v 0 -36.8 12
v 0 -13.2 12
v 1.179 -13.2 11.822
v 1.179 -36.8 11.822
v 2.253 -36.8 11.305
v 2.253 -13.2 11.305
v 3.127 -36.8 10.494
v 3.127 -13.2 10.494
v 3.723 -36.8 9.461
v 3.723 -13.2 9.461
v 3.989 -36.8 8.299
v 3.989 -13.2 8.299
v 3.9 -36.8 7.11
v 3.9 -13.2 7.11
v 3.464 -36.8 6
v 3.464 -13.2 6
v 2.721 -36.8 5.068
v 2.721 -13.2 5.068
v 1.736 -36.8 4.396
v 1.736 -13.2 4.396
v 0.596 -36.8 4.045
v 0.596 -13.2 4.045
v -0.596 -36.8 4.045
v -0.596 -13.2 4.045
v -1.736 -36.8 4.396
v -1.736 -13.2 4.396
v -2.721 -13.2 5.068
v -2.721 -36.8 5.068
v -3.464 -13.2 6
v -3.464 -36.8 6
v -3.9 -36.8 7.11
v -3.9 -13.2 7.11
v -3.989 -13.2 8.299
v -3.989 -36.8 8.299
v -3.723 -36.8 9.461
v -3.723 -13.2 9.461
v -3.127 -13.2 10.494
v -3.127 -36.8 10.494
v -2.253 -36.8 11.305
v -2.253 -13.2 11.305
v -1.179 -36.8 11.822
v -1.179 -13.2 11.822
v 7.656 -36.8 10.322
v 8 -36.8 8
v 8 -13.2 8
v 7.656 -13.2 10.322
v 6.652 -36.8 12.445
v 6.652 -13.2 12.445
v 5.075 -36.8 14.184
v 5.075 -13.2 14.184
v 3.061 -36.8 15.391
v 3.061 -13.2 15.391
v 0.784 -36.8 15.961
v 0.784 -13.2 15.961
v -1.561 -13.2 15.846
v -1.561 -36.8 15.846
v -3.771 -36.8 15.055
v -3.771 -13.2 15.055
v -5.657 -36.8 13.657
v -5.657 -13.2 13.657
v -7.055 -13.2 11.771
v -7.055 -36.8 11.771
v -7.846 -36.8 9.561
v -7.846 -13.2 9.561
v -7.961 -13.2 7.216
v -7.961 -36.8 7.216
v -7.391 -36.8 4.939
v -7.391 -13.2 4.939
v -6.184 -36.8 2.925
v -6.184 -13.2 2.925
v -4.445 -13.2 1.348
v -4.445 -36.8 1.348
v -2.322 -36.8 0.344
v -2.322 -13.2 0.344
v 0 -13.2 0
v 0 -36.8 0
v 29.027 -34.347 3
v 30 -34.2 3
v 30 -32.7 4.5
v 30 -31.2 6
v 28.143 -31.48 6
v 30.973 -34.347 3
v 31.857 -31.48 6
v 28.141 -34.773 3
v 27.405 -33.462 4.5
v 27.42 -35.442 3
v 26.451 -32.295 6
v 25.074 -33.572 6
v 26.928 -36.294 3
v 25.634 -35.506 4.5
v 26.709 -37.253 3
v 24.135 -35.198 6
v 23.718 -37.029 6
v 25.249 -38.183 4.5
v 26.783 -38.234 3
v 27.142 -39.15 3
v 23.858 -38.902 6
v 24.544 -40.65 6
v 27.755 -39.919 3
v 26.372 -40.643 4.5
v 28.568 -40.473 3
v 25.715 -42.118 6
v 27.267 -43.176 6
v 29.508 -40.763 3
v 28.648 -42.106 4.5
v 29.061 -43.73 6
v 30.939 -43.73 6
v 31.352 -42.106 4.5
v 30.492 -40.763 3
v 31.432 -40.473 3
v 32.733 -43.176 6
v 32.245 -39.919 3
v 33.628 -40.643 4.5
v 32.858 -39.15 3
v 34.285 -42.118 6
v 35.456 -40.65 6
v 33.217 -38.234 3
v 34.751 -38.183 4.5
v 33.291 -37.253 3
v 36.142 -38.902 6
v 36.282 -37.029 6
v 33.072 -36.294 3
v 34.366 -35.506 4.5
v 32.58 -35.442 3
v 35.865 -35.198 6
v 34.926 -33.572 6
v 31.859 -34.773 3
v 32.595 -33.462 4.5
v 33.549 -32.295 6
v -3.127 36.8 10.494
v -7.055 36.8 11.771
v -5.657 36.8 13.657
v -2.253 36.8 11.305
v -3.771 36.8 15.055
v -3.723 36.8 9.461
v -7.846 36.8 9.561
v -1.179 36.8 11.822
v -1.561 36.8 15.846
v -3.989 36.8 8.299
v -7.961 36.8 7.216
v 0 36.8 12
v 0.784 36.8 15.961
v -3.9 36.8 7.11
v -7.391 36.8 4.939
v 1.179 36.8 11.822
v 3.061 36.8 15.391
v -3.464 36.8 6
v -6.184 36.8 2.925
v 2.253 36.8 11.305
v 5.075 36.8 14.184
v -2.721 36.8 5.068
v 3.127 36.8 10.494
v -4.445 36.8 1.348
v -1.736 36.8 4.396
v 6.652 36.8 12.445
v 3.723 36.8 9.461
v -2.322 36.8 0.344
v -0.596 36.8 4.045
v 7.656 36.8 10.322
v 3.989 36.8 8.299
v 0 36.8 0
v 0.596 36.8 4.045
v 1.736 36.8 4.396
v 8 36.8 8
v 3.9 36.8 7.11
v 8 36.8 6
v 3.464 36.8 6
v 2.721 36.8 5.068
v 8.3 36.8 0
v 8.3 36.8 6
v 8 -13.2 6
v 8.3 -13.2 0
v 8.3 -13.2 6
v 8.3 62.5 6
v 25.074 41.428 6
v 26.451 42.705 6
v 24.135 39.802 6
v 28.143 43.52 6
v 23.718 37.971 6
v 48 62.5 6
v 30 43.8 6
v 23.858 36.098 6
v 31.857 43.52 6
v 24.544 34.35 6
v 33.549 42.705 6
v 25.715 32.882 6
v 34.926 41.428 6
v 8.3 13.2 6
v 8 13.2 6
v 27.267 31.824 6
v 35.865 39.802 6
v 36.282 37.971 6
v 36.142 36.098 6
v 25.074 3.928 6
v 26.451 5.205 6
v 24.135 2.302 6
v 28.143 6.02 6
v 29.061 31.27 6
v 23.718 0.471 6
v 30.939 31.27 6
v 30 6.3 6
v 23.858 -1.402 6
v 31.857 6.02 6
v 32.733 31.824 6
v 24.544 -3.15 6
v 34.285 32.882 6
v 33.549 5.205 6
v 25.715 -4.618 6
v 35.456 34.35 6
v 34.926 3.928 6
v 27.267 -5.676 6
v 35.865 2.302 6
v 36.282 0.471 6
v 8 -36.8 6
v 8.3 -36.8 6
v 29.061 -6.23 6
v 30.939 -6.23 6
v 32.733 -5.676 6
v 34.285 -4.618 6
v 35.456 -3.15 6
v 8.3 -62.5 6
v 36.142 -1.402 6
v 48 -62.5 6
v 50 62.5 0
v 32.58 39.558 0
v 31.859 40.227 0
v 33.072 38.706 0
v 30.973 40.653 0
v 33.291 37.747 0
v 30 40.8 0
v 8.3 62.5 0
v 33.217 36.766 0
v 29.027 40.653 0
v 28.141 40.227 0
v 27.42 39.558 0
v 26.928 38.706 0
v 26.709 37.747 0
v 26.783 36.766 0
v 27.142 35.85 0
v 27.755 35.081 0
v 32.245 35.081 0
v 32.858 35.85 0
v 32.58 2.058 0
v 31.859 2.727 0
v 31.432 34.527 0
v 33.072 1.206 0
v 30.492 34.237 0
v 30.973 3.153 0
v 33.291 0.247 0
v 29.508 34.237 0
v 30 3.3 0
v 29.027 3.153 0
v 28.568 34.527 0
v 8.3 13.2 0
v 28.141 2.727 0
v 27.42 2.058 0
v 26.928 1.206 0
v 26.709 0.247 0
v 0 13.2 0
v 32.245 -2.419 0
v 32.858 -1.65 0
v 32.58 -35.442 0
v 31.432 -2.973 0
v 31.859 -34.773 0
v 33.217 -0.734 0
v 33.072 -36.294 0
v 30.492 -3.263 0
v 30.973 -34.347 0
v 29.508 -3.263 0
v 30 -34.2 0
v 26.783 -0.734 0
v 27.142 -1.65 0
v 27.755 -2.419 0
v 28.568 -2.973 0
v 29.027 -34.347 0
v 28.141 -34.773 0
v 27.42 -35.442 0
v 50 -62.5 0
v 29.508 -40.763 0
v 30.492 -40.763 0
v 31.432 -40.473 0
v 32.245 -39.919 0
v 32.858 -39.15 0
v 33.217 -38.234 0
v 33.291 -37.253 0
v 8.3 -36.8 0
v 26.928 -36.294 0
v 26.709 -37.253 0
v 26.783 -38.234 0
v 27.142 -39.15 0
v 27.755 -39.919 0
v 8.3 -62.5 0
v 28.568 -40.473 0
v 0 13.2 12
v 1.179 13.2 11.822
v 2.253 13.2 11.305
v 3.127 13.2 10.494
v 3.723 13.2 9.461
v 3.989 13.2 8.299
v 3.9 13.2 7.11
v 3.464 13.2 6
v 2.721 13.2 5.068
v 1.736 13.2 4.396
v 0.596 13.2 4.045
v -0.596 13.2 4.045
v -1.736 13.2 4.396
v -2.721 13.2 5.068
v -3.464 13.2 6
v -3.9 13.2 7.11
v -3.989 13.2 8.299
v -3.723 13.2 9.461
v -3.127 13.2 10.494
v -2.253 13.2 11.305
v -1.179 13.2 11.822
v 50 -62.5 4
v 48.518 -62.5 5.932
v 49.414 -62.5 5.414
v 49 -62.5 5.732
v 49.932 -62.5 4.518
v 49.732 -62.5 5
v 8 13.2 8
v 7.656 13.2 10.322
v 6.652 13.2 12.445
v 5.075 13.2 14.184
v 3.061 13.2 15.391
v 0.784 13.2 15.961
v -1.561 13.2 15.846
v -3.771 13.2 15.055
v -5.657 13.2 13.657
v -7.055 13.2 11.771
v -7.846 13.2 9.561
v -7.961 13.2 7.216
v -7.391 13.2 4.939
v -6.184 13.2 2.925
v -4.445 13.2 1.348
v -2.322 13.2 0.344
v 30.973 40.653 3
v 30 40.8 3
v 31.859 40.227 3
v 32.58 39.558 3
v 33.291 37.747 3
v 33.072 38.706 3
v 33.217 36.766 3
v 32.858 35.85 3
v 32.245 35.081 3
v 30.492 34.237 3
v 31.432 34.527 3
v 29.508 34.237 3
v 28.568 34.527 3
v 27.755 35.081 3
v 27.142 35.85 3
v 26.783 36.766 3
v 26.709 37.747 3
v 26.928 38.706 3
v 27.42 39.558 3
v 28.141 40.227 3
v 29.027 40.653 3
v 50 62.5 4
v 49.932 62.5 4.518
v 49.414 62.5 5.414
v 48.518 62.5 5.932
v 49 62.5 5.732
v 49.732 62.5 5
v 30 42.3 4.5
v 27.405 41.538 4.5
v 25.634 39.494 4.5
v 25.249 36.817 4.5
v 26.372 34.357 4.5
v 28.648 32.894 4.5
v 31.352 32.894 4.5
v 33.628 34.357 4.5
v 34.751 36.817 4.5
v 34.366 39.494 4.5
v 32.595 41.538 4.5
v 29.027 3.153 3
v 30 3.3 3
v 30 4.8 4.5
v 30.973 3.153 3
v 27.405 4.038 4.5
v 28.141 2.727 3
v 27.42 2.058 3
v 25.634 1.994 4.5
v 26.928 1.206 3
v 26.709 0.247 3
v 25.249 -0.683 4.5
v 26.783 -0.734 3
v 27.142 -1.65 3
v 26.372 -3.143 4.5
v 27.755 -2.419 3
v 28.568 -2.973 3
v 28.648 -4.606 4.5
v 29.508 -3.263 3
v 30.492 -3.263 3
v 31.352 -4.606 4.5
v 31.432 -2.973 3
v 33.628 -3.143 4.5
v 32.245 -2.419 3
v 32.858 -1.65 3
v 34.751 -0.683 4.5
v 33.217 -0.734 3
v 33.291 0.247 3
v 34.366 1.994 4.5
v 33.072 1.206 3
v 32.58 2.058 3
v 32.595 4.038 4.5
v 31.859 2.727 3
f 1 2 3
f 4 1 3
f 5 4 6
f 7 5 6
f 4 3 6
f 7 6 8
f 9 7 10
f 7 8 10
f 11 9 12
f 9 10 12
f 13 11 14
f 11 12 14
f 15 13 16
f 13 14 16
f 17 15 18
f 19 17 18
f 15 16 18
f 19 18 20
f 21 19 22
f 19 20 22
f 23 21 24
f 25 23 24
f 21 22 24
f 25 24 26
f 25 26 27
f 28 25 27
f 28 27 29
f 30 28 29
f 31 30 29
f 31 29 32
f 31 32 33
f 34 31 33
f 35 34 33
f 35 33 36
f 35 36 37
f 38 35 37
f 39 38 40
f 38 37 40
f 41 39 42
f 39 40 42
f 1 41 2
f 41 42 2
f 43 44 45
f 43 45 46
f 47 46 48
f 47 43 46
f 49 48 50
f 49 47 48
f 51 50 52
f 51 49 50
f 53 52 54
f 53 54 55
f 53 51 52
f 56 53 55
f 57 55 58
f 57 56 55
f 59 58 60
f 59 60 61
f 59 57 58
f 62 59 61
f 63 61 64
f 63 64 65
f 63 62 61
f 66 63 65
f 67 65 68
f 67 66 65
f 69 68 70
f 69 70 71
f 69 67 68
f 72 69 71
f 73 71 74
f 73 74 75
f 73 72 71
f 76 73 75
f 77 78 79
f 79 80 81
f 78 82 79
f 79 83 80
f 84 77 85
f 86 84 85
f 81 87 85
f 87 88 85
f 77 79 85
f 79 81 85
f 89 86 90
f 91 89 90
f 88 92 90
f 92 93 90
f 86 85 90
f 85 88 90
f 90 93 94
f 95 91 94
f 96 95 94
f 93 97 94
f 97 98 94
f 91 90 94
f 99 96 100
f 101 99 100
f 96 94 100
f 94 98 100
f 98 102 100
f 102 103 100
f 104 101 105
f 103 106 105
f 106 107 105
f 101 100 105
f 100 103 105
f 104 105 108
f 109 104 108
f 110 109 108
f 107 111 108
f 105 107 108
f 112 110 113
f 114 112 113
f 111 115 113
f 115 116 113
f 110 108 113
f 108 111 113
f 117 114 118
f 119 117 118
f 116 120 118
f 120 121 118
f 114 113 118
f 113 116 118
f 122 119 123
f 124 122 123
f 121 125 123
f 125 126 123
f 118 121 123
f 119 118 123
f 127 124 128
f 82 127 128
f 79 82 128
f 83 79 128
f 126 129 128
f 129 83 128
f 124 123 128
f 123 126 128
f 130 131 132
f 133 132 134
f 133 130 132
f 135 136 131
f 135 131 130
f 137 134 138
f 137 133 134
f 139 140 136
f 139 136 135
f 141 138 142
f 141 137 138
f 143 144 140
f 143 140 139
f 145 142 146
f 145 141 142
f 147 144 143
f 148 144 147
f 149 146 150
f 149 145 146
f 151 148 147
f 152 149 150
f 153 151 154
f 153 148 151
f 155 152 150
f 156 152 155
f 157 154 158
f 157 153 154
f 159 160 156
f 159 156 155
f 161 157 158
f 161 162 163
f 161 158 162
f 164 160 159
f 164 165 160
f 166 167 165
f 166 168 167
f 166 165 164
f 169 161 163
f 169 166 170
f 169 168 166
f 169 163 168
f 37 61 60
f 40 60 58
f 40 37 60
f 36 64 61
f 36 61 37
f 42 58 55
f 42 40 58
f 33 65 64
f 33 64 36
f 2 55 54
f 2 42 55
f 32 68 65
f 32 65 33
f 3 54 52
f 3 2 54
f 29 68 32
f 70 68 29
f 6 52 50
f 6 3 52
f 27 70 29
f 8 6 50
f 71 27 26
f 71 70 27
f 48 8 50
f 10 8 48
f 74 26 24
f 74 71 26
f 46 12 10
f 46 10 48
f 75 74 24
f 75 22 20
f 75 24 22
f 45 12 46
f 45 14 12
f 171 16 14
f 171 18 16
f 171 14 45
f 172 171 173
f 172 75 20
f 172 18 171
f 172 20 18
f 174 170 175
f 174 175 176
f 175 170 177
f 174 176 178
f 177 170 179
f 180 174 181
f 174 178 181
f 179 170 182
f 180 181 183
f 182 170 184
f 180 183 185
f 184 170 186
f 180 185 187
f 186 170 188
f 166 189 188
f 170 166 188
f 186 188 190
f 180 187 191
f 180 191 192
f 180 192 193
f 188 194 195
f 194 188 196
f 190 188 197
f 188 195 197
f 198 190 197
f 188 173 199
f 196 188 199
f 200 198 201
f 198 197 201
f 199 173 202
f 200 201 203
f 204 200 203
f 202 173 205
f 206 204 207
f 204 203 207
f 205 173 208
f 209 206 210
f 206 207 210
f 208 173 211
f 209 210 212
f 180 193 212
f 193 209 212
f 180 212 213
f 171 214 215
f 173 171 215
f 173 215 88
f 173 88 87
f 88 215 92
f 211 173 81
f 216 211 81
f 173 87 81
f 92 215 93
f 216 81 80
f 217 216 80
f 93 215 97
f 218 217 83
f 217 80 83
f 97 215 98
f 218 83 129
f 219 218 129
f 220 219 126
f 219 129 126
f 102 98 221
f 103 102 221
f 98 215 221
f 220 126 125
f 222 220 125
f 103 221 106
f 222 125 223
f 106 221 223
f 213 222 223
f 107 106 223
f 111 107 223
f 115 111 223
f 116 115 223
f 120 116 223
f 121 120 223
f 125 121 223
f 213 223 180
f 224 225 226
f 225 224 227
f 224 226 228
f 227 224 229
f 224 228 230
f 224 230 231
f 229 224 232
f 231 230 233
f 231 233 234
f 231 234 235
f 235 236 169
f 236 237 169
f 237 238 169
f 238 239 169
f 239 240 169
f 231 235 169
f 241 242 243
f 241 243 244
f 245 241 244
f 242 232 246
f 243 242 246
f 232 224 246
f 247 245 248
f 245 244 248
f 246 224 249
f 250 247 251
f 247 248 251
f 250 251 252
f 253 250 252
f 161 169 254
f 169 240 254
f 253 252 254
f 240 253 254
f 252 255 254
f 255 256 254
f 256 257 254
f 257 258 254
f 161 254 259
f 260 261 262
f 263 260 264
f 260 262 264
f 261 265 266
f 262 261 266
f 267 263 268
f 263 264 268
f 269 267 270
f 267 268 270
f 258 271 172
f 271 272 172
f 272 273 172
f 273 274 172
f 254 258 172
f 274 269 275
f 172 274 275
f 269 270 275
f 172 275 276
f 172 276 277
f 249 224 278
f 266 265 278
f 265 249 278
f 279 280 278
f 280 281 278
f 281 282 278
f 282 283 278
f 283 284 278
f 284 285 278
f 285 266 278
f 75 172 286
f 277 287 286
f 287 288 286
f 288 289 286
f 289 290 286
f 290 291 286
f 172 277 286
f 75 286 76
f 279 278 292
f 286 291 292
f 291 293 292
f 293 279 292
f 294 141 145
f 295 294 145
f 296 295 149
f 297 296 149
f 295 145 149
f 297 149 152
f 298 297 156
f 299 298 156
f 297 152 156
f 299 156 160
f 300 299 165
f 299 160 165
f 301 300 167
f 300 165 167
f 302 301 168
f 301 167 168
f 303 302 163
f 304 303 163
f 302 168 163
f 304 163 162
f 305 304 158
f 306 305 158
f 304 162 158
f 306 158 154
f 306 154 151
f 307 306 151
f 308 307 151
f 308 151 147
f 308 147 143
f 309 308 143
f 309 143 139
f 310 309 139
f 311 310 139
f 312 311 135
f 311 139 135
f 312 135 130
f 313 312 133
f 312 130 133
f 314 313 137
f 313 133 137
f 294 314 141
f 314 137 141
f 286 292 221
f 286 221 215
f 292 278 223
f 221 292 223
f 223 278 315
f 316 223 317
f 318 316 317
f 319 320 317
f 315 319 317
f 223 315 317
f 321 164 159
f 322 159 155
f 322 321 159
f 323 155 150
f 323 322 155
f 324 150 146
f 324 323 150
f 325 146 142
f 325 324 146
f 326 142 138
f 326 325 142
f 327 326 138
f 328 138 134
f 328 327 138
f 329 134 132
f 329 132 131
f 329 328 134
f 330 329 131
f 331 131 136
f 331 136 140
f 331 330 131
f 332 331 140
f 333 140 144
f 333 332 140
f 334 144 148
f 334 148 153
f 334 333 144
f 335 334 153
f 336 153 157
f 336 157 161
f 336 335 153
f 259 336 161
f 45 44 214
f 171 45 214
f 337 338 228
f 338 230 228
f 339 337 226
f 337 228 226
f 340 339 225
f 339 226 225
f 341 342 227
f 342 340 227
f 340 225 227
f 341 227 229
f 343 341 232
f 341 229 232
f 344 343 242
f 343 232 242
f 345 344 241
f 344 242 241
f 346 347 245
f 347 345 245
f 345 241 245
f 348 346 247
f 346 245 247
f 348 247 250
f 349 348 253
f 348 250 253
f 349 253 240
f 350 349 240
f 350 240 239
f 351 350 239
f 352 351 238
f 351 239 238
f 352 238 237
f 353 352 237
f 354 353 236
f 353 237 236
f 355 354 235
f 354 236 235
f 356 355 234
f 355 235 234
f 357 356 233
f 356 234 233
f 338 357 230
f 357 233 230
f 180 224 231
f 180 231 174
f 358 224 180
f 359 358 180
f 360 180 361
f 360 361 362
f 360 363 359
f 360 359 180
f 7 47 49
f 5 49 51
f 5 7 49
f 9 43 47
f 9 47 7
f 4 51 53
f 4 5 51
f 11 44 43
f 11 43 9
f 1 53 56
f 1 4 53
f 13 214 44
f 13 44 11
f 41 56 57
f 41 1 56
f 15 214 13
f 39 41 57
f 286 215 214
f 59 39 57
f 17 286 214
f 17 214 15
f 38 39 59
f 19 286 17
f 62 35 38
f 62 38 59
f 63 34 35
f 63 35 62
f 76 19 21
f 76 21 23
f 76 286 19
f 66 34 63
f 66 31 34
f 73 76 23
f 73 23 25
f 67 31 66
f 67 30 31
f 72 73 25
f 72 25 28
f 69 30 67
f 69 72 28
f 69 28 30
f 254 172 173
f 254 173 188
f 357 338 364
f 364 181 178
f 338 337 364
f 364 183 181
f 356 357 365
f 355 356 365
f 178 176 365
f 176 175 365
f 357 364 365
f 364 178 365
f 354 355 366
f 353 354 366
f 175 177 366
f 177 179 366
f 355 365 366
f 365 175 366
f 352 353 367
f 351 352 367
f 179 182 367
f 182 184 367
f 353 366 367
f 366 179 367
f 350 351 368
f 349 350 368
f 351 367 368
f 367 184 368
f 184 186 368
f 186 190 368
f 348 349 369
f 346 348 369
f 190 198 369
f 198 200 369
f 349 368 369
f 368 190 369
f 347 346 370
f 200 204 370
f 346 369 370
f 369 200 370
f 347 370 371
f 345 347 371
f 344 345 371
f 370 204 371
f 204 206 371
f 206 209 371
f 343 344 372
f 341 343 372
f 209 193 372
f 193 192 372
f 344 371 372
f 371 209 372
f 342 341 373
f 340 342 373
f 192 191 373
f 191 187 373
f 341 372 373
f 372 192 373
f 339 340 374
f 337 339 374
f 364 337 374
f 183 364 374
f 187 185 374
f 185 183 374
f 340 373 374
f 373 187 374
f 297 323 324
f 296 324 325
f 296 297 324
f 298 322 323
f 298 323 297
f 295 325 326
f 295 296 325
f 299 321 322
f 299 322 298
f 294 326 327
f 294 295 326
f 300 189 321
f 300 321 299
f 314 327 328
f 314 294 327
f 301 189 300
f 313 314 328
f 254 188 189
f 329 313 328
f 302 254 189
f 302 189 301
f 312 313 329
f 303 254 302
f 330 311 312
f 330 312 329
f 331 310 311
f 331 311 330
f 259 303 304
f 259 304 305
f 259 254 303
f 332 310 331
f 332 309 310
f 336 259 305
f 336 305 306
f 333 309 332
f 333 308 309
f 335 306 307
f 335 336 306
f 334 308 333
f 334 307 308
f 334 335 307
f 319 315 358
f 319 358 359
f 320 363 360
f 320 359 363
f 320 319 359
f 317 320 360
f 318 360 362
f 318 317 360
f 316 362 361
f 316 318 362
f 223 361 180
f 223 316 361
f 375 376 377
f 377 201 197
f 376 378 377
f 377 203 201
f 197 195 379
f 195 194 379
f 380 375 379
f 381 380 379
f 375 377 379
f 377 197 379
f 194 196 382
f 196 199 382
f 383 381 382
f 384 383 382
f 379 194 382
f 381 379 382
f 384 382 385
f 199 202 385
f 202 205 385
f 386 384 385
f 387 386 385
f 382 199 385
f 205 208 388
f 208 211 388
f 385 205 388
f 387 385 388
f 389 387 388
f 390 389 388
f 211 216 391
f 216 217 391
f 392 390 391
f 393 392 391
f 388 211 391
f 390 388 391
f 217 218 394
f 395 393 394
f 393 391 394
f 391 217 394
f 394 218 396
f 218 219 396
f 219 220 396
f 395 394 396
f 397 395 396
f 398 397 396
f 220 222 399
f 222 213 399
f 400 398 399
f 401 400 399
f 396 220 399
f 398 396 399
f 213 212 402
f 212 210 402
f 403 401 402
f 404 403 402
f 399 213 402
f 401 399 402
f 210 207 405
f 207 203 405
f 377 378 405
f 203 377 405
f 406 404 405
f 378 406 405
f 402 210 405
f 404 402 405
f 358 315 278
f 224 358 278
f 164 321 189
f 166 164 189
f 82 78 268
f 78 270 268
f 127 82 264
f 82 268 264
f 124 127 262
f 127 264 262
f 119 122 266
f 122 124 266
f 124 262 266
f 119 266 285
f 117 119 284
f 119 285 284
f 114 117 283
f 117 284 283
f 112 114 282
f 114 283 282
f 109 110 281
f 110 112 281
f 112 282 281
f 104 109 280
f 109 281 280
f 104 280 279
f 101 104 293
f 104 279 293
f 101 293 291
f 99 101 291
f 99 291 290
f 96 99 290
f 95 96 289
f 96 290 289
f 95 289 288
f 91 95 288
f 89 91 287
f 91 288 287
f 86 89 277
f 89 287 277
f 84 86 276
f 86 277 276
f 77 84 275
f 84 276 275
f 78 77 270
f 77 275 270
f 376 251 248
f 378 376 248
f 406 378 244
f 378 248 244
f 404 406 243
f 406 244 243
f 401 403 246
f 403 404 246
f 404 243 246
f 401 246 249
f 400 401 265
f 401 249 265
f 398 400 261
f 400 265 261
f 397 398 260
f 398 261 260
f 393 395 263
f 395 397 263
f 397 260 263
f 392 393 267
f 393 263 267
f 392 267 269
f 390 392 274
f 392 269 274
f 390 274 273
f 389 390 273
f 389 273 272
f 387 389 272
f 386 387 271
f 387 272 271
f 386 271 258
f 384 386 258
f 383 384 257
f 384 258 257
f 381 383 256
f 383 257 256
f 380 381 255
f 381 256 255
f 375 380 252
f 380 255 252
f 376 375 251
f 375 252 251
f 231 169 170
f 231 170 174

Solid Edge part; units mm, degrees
sketch "Sketch1" plane through (0, 0, 0) normal (0, -1, 0) x (1, 0, 0)
  arc A0 (0, 0) -> (8, 8) centre (0, 8) cw
  line L0 (8, 8) -> (8, 6)
  line L1 (8, 6) -> (48, 6)
  arc A1 (48, 6) -> (50, 4) centre (48, 4) cw
  line L2 (50, 4) -> (50, 0)
  line L3 (50, 0) -> (0, 0)
extrude "ExtrudedProtrusion_1" add sketch "Sketch1" against normal blind 62.5 and the other way blind 62.5
sketch "Sketch2" plane through (0, 0, 0) normal (0, 0, 1) x (1, 0, 0)
  line L0 (-21, 62.5) -> (-21, -62.5)
  line L1 (-21, -62.5) -> (8.3, -62.5)
  line L2 (8.3, -62.5) -> (8.3, -36.8)
  line L3 (8.3, -36.8) -> (-16, -36.8)
  line L4 (-16, -36.8) -> (-16, -13.2)
  line L5 (-16, -13.2) -> (8.3, -13.2)
  line L6 (8.3, -13.2) -> (8.3, 13.2)
  line L7 (8.3, 13.2) -> (-16, 13.2)
  line L8 (-16, 13.2) -> (-16, 36.8)
  line L9 (-16, 36.8) -> (8.3, 36.8)
  line L10 (8.3, 36.8) -> (8.3, 62.5)
  line L11 (8.3, 62.5) -> (-21, 62.5)
extrude "ExtrudedCutout_1" cut sketch "Sketch2" along normal blind 16
sketch "Sketch3" plane through (30, 0, 0) normal (1, 0, 0) x (0, 1, 0)
  line L0 (37.5, 6) -> (43.8, 6)
  line L1 (43.8, 6) -> (40.8, 3)
  line L2 (40.8, 3) -> (40.8, 0)
  line L3 (40.8, 0) -> (37.5, 0)
  line L4 (37.5, 0) -> (37.5, 6)
revolve "RevolvedCutout1" cut sketch "Sketch3" angle 360 about axis through (30, 37.5, 0) along (0, 0, 1)
sketch "Sketch4" plane through (30, 0, 0) normal (1, 0, 0) x (0, 1, 0)
  line L0 (-37.5, 6) -> (-31.2, 6)
  line L1 (-31.2, 6) -> (-34.2, 3)
  line L2 (-34.2, 3) -> (-34.2, 0)
  line L3 (-34.2, 0) -> (-37.5, 0)
  line L4 (-37.5, 0) -> (-37.5, 6)
revolve "RevolvedCutout2" cut sketch "Sketch4" angle 360 about axis through (30, -37.5, 0) along (0, 0, 1)
sketch "Sketch5" plane through (30, 0, 0) normal (1, 0, 0) x (0, 1, 0)
  line L0 (0, 6) -> (6.3, 6)
  line L1 (6.3, 6) -> (3.3, 3)
  line L2 (3.3, 3) -> (3.3, 0)
  line L3 (3.3, 0) -> (0, 0)
  line L4 (0, 0) -> (0, 6)
revolve "RevolvedCutout3" cut sketch "Sketch5" angle 360 about axis through (30, 0, 0) along (0, 0, 1)
sketch "Sketch6" plane through (0, 0, 0) normal (1, 0, 0) x (0, 1, 0)
  arc A0 (-60.5, 8) -> (-56.5, 12) centre (-56.5, 8) cw
  line L0 (-56.5, 12) -> (56.5, 12)
  arc A1 (56.5, 12) -> (60.5, 8) centre (56.5, 8) cw
  line L1 (60.5, 8) -> (-60.5, 8)
revolve "RevolvedCutout4" cut sketch "Sketch6" angle 360 about axis through (0, 60.5, 8) along (0, -1, 0)
